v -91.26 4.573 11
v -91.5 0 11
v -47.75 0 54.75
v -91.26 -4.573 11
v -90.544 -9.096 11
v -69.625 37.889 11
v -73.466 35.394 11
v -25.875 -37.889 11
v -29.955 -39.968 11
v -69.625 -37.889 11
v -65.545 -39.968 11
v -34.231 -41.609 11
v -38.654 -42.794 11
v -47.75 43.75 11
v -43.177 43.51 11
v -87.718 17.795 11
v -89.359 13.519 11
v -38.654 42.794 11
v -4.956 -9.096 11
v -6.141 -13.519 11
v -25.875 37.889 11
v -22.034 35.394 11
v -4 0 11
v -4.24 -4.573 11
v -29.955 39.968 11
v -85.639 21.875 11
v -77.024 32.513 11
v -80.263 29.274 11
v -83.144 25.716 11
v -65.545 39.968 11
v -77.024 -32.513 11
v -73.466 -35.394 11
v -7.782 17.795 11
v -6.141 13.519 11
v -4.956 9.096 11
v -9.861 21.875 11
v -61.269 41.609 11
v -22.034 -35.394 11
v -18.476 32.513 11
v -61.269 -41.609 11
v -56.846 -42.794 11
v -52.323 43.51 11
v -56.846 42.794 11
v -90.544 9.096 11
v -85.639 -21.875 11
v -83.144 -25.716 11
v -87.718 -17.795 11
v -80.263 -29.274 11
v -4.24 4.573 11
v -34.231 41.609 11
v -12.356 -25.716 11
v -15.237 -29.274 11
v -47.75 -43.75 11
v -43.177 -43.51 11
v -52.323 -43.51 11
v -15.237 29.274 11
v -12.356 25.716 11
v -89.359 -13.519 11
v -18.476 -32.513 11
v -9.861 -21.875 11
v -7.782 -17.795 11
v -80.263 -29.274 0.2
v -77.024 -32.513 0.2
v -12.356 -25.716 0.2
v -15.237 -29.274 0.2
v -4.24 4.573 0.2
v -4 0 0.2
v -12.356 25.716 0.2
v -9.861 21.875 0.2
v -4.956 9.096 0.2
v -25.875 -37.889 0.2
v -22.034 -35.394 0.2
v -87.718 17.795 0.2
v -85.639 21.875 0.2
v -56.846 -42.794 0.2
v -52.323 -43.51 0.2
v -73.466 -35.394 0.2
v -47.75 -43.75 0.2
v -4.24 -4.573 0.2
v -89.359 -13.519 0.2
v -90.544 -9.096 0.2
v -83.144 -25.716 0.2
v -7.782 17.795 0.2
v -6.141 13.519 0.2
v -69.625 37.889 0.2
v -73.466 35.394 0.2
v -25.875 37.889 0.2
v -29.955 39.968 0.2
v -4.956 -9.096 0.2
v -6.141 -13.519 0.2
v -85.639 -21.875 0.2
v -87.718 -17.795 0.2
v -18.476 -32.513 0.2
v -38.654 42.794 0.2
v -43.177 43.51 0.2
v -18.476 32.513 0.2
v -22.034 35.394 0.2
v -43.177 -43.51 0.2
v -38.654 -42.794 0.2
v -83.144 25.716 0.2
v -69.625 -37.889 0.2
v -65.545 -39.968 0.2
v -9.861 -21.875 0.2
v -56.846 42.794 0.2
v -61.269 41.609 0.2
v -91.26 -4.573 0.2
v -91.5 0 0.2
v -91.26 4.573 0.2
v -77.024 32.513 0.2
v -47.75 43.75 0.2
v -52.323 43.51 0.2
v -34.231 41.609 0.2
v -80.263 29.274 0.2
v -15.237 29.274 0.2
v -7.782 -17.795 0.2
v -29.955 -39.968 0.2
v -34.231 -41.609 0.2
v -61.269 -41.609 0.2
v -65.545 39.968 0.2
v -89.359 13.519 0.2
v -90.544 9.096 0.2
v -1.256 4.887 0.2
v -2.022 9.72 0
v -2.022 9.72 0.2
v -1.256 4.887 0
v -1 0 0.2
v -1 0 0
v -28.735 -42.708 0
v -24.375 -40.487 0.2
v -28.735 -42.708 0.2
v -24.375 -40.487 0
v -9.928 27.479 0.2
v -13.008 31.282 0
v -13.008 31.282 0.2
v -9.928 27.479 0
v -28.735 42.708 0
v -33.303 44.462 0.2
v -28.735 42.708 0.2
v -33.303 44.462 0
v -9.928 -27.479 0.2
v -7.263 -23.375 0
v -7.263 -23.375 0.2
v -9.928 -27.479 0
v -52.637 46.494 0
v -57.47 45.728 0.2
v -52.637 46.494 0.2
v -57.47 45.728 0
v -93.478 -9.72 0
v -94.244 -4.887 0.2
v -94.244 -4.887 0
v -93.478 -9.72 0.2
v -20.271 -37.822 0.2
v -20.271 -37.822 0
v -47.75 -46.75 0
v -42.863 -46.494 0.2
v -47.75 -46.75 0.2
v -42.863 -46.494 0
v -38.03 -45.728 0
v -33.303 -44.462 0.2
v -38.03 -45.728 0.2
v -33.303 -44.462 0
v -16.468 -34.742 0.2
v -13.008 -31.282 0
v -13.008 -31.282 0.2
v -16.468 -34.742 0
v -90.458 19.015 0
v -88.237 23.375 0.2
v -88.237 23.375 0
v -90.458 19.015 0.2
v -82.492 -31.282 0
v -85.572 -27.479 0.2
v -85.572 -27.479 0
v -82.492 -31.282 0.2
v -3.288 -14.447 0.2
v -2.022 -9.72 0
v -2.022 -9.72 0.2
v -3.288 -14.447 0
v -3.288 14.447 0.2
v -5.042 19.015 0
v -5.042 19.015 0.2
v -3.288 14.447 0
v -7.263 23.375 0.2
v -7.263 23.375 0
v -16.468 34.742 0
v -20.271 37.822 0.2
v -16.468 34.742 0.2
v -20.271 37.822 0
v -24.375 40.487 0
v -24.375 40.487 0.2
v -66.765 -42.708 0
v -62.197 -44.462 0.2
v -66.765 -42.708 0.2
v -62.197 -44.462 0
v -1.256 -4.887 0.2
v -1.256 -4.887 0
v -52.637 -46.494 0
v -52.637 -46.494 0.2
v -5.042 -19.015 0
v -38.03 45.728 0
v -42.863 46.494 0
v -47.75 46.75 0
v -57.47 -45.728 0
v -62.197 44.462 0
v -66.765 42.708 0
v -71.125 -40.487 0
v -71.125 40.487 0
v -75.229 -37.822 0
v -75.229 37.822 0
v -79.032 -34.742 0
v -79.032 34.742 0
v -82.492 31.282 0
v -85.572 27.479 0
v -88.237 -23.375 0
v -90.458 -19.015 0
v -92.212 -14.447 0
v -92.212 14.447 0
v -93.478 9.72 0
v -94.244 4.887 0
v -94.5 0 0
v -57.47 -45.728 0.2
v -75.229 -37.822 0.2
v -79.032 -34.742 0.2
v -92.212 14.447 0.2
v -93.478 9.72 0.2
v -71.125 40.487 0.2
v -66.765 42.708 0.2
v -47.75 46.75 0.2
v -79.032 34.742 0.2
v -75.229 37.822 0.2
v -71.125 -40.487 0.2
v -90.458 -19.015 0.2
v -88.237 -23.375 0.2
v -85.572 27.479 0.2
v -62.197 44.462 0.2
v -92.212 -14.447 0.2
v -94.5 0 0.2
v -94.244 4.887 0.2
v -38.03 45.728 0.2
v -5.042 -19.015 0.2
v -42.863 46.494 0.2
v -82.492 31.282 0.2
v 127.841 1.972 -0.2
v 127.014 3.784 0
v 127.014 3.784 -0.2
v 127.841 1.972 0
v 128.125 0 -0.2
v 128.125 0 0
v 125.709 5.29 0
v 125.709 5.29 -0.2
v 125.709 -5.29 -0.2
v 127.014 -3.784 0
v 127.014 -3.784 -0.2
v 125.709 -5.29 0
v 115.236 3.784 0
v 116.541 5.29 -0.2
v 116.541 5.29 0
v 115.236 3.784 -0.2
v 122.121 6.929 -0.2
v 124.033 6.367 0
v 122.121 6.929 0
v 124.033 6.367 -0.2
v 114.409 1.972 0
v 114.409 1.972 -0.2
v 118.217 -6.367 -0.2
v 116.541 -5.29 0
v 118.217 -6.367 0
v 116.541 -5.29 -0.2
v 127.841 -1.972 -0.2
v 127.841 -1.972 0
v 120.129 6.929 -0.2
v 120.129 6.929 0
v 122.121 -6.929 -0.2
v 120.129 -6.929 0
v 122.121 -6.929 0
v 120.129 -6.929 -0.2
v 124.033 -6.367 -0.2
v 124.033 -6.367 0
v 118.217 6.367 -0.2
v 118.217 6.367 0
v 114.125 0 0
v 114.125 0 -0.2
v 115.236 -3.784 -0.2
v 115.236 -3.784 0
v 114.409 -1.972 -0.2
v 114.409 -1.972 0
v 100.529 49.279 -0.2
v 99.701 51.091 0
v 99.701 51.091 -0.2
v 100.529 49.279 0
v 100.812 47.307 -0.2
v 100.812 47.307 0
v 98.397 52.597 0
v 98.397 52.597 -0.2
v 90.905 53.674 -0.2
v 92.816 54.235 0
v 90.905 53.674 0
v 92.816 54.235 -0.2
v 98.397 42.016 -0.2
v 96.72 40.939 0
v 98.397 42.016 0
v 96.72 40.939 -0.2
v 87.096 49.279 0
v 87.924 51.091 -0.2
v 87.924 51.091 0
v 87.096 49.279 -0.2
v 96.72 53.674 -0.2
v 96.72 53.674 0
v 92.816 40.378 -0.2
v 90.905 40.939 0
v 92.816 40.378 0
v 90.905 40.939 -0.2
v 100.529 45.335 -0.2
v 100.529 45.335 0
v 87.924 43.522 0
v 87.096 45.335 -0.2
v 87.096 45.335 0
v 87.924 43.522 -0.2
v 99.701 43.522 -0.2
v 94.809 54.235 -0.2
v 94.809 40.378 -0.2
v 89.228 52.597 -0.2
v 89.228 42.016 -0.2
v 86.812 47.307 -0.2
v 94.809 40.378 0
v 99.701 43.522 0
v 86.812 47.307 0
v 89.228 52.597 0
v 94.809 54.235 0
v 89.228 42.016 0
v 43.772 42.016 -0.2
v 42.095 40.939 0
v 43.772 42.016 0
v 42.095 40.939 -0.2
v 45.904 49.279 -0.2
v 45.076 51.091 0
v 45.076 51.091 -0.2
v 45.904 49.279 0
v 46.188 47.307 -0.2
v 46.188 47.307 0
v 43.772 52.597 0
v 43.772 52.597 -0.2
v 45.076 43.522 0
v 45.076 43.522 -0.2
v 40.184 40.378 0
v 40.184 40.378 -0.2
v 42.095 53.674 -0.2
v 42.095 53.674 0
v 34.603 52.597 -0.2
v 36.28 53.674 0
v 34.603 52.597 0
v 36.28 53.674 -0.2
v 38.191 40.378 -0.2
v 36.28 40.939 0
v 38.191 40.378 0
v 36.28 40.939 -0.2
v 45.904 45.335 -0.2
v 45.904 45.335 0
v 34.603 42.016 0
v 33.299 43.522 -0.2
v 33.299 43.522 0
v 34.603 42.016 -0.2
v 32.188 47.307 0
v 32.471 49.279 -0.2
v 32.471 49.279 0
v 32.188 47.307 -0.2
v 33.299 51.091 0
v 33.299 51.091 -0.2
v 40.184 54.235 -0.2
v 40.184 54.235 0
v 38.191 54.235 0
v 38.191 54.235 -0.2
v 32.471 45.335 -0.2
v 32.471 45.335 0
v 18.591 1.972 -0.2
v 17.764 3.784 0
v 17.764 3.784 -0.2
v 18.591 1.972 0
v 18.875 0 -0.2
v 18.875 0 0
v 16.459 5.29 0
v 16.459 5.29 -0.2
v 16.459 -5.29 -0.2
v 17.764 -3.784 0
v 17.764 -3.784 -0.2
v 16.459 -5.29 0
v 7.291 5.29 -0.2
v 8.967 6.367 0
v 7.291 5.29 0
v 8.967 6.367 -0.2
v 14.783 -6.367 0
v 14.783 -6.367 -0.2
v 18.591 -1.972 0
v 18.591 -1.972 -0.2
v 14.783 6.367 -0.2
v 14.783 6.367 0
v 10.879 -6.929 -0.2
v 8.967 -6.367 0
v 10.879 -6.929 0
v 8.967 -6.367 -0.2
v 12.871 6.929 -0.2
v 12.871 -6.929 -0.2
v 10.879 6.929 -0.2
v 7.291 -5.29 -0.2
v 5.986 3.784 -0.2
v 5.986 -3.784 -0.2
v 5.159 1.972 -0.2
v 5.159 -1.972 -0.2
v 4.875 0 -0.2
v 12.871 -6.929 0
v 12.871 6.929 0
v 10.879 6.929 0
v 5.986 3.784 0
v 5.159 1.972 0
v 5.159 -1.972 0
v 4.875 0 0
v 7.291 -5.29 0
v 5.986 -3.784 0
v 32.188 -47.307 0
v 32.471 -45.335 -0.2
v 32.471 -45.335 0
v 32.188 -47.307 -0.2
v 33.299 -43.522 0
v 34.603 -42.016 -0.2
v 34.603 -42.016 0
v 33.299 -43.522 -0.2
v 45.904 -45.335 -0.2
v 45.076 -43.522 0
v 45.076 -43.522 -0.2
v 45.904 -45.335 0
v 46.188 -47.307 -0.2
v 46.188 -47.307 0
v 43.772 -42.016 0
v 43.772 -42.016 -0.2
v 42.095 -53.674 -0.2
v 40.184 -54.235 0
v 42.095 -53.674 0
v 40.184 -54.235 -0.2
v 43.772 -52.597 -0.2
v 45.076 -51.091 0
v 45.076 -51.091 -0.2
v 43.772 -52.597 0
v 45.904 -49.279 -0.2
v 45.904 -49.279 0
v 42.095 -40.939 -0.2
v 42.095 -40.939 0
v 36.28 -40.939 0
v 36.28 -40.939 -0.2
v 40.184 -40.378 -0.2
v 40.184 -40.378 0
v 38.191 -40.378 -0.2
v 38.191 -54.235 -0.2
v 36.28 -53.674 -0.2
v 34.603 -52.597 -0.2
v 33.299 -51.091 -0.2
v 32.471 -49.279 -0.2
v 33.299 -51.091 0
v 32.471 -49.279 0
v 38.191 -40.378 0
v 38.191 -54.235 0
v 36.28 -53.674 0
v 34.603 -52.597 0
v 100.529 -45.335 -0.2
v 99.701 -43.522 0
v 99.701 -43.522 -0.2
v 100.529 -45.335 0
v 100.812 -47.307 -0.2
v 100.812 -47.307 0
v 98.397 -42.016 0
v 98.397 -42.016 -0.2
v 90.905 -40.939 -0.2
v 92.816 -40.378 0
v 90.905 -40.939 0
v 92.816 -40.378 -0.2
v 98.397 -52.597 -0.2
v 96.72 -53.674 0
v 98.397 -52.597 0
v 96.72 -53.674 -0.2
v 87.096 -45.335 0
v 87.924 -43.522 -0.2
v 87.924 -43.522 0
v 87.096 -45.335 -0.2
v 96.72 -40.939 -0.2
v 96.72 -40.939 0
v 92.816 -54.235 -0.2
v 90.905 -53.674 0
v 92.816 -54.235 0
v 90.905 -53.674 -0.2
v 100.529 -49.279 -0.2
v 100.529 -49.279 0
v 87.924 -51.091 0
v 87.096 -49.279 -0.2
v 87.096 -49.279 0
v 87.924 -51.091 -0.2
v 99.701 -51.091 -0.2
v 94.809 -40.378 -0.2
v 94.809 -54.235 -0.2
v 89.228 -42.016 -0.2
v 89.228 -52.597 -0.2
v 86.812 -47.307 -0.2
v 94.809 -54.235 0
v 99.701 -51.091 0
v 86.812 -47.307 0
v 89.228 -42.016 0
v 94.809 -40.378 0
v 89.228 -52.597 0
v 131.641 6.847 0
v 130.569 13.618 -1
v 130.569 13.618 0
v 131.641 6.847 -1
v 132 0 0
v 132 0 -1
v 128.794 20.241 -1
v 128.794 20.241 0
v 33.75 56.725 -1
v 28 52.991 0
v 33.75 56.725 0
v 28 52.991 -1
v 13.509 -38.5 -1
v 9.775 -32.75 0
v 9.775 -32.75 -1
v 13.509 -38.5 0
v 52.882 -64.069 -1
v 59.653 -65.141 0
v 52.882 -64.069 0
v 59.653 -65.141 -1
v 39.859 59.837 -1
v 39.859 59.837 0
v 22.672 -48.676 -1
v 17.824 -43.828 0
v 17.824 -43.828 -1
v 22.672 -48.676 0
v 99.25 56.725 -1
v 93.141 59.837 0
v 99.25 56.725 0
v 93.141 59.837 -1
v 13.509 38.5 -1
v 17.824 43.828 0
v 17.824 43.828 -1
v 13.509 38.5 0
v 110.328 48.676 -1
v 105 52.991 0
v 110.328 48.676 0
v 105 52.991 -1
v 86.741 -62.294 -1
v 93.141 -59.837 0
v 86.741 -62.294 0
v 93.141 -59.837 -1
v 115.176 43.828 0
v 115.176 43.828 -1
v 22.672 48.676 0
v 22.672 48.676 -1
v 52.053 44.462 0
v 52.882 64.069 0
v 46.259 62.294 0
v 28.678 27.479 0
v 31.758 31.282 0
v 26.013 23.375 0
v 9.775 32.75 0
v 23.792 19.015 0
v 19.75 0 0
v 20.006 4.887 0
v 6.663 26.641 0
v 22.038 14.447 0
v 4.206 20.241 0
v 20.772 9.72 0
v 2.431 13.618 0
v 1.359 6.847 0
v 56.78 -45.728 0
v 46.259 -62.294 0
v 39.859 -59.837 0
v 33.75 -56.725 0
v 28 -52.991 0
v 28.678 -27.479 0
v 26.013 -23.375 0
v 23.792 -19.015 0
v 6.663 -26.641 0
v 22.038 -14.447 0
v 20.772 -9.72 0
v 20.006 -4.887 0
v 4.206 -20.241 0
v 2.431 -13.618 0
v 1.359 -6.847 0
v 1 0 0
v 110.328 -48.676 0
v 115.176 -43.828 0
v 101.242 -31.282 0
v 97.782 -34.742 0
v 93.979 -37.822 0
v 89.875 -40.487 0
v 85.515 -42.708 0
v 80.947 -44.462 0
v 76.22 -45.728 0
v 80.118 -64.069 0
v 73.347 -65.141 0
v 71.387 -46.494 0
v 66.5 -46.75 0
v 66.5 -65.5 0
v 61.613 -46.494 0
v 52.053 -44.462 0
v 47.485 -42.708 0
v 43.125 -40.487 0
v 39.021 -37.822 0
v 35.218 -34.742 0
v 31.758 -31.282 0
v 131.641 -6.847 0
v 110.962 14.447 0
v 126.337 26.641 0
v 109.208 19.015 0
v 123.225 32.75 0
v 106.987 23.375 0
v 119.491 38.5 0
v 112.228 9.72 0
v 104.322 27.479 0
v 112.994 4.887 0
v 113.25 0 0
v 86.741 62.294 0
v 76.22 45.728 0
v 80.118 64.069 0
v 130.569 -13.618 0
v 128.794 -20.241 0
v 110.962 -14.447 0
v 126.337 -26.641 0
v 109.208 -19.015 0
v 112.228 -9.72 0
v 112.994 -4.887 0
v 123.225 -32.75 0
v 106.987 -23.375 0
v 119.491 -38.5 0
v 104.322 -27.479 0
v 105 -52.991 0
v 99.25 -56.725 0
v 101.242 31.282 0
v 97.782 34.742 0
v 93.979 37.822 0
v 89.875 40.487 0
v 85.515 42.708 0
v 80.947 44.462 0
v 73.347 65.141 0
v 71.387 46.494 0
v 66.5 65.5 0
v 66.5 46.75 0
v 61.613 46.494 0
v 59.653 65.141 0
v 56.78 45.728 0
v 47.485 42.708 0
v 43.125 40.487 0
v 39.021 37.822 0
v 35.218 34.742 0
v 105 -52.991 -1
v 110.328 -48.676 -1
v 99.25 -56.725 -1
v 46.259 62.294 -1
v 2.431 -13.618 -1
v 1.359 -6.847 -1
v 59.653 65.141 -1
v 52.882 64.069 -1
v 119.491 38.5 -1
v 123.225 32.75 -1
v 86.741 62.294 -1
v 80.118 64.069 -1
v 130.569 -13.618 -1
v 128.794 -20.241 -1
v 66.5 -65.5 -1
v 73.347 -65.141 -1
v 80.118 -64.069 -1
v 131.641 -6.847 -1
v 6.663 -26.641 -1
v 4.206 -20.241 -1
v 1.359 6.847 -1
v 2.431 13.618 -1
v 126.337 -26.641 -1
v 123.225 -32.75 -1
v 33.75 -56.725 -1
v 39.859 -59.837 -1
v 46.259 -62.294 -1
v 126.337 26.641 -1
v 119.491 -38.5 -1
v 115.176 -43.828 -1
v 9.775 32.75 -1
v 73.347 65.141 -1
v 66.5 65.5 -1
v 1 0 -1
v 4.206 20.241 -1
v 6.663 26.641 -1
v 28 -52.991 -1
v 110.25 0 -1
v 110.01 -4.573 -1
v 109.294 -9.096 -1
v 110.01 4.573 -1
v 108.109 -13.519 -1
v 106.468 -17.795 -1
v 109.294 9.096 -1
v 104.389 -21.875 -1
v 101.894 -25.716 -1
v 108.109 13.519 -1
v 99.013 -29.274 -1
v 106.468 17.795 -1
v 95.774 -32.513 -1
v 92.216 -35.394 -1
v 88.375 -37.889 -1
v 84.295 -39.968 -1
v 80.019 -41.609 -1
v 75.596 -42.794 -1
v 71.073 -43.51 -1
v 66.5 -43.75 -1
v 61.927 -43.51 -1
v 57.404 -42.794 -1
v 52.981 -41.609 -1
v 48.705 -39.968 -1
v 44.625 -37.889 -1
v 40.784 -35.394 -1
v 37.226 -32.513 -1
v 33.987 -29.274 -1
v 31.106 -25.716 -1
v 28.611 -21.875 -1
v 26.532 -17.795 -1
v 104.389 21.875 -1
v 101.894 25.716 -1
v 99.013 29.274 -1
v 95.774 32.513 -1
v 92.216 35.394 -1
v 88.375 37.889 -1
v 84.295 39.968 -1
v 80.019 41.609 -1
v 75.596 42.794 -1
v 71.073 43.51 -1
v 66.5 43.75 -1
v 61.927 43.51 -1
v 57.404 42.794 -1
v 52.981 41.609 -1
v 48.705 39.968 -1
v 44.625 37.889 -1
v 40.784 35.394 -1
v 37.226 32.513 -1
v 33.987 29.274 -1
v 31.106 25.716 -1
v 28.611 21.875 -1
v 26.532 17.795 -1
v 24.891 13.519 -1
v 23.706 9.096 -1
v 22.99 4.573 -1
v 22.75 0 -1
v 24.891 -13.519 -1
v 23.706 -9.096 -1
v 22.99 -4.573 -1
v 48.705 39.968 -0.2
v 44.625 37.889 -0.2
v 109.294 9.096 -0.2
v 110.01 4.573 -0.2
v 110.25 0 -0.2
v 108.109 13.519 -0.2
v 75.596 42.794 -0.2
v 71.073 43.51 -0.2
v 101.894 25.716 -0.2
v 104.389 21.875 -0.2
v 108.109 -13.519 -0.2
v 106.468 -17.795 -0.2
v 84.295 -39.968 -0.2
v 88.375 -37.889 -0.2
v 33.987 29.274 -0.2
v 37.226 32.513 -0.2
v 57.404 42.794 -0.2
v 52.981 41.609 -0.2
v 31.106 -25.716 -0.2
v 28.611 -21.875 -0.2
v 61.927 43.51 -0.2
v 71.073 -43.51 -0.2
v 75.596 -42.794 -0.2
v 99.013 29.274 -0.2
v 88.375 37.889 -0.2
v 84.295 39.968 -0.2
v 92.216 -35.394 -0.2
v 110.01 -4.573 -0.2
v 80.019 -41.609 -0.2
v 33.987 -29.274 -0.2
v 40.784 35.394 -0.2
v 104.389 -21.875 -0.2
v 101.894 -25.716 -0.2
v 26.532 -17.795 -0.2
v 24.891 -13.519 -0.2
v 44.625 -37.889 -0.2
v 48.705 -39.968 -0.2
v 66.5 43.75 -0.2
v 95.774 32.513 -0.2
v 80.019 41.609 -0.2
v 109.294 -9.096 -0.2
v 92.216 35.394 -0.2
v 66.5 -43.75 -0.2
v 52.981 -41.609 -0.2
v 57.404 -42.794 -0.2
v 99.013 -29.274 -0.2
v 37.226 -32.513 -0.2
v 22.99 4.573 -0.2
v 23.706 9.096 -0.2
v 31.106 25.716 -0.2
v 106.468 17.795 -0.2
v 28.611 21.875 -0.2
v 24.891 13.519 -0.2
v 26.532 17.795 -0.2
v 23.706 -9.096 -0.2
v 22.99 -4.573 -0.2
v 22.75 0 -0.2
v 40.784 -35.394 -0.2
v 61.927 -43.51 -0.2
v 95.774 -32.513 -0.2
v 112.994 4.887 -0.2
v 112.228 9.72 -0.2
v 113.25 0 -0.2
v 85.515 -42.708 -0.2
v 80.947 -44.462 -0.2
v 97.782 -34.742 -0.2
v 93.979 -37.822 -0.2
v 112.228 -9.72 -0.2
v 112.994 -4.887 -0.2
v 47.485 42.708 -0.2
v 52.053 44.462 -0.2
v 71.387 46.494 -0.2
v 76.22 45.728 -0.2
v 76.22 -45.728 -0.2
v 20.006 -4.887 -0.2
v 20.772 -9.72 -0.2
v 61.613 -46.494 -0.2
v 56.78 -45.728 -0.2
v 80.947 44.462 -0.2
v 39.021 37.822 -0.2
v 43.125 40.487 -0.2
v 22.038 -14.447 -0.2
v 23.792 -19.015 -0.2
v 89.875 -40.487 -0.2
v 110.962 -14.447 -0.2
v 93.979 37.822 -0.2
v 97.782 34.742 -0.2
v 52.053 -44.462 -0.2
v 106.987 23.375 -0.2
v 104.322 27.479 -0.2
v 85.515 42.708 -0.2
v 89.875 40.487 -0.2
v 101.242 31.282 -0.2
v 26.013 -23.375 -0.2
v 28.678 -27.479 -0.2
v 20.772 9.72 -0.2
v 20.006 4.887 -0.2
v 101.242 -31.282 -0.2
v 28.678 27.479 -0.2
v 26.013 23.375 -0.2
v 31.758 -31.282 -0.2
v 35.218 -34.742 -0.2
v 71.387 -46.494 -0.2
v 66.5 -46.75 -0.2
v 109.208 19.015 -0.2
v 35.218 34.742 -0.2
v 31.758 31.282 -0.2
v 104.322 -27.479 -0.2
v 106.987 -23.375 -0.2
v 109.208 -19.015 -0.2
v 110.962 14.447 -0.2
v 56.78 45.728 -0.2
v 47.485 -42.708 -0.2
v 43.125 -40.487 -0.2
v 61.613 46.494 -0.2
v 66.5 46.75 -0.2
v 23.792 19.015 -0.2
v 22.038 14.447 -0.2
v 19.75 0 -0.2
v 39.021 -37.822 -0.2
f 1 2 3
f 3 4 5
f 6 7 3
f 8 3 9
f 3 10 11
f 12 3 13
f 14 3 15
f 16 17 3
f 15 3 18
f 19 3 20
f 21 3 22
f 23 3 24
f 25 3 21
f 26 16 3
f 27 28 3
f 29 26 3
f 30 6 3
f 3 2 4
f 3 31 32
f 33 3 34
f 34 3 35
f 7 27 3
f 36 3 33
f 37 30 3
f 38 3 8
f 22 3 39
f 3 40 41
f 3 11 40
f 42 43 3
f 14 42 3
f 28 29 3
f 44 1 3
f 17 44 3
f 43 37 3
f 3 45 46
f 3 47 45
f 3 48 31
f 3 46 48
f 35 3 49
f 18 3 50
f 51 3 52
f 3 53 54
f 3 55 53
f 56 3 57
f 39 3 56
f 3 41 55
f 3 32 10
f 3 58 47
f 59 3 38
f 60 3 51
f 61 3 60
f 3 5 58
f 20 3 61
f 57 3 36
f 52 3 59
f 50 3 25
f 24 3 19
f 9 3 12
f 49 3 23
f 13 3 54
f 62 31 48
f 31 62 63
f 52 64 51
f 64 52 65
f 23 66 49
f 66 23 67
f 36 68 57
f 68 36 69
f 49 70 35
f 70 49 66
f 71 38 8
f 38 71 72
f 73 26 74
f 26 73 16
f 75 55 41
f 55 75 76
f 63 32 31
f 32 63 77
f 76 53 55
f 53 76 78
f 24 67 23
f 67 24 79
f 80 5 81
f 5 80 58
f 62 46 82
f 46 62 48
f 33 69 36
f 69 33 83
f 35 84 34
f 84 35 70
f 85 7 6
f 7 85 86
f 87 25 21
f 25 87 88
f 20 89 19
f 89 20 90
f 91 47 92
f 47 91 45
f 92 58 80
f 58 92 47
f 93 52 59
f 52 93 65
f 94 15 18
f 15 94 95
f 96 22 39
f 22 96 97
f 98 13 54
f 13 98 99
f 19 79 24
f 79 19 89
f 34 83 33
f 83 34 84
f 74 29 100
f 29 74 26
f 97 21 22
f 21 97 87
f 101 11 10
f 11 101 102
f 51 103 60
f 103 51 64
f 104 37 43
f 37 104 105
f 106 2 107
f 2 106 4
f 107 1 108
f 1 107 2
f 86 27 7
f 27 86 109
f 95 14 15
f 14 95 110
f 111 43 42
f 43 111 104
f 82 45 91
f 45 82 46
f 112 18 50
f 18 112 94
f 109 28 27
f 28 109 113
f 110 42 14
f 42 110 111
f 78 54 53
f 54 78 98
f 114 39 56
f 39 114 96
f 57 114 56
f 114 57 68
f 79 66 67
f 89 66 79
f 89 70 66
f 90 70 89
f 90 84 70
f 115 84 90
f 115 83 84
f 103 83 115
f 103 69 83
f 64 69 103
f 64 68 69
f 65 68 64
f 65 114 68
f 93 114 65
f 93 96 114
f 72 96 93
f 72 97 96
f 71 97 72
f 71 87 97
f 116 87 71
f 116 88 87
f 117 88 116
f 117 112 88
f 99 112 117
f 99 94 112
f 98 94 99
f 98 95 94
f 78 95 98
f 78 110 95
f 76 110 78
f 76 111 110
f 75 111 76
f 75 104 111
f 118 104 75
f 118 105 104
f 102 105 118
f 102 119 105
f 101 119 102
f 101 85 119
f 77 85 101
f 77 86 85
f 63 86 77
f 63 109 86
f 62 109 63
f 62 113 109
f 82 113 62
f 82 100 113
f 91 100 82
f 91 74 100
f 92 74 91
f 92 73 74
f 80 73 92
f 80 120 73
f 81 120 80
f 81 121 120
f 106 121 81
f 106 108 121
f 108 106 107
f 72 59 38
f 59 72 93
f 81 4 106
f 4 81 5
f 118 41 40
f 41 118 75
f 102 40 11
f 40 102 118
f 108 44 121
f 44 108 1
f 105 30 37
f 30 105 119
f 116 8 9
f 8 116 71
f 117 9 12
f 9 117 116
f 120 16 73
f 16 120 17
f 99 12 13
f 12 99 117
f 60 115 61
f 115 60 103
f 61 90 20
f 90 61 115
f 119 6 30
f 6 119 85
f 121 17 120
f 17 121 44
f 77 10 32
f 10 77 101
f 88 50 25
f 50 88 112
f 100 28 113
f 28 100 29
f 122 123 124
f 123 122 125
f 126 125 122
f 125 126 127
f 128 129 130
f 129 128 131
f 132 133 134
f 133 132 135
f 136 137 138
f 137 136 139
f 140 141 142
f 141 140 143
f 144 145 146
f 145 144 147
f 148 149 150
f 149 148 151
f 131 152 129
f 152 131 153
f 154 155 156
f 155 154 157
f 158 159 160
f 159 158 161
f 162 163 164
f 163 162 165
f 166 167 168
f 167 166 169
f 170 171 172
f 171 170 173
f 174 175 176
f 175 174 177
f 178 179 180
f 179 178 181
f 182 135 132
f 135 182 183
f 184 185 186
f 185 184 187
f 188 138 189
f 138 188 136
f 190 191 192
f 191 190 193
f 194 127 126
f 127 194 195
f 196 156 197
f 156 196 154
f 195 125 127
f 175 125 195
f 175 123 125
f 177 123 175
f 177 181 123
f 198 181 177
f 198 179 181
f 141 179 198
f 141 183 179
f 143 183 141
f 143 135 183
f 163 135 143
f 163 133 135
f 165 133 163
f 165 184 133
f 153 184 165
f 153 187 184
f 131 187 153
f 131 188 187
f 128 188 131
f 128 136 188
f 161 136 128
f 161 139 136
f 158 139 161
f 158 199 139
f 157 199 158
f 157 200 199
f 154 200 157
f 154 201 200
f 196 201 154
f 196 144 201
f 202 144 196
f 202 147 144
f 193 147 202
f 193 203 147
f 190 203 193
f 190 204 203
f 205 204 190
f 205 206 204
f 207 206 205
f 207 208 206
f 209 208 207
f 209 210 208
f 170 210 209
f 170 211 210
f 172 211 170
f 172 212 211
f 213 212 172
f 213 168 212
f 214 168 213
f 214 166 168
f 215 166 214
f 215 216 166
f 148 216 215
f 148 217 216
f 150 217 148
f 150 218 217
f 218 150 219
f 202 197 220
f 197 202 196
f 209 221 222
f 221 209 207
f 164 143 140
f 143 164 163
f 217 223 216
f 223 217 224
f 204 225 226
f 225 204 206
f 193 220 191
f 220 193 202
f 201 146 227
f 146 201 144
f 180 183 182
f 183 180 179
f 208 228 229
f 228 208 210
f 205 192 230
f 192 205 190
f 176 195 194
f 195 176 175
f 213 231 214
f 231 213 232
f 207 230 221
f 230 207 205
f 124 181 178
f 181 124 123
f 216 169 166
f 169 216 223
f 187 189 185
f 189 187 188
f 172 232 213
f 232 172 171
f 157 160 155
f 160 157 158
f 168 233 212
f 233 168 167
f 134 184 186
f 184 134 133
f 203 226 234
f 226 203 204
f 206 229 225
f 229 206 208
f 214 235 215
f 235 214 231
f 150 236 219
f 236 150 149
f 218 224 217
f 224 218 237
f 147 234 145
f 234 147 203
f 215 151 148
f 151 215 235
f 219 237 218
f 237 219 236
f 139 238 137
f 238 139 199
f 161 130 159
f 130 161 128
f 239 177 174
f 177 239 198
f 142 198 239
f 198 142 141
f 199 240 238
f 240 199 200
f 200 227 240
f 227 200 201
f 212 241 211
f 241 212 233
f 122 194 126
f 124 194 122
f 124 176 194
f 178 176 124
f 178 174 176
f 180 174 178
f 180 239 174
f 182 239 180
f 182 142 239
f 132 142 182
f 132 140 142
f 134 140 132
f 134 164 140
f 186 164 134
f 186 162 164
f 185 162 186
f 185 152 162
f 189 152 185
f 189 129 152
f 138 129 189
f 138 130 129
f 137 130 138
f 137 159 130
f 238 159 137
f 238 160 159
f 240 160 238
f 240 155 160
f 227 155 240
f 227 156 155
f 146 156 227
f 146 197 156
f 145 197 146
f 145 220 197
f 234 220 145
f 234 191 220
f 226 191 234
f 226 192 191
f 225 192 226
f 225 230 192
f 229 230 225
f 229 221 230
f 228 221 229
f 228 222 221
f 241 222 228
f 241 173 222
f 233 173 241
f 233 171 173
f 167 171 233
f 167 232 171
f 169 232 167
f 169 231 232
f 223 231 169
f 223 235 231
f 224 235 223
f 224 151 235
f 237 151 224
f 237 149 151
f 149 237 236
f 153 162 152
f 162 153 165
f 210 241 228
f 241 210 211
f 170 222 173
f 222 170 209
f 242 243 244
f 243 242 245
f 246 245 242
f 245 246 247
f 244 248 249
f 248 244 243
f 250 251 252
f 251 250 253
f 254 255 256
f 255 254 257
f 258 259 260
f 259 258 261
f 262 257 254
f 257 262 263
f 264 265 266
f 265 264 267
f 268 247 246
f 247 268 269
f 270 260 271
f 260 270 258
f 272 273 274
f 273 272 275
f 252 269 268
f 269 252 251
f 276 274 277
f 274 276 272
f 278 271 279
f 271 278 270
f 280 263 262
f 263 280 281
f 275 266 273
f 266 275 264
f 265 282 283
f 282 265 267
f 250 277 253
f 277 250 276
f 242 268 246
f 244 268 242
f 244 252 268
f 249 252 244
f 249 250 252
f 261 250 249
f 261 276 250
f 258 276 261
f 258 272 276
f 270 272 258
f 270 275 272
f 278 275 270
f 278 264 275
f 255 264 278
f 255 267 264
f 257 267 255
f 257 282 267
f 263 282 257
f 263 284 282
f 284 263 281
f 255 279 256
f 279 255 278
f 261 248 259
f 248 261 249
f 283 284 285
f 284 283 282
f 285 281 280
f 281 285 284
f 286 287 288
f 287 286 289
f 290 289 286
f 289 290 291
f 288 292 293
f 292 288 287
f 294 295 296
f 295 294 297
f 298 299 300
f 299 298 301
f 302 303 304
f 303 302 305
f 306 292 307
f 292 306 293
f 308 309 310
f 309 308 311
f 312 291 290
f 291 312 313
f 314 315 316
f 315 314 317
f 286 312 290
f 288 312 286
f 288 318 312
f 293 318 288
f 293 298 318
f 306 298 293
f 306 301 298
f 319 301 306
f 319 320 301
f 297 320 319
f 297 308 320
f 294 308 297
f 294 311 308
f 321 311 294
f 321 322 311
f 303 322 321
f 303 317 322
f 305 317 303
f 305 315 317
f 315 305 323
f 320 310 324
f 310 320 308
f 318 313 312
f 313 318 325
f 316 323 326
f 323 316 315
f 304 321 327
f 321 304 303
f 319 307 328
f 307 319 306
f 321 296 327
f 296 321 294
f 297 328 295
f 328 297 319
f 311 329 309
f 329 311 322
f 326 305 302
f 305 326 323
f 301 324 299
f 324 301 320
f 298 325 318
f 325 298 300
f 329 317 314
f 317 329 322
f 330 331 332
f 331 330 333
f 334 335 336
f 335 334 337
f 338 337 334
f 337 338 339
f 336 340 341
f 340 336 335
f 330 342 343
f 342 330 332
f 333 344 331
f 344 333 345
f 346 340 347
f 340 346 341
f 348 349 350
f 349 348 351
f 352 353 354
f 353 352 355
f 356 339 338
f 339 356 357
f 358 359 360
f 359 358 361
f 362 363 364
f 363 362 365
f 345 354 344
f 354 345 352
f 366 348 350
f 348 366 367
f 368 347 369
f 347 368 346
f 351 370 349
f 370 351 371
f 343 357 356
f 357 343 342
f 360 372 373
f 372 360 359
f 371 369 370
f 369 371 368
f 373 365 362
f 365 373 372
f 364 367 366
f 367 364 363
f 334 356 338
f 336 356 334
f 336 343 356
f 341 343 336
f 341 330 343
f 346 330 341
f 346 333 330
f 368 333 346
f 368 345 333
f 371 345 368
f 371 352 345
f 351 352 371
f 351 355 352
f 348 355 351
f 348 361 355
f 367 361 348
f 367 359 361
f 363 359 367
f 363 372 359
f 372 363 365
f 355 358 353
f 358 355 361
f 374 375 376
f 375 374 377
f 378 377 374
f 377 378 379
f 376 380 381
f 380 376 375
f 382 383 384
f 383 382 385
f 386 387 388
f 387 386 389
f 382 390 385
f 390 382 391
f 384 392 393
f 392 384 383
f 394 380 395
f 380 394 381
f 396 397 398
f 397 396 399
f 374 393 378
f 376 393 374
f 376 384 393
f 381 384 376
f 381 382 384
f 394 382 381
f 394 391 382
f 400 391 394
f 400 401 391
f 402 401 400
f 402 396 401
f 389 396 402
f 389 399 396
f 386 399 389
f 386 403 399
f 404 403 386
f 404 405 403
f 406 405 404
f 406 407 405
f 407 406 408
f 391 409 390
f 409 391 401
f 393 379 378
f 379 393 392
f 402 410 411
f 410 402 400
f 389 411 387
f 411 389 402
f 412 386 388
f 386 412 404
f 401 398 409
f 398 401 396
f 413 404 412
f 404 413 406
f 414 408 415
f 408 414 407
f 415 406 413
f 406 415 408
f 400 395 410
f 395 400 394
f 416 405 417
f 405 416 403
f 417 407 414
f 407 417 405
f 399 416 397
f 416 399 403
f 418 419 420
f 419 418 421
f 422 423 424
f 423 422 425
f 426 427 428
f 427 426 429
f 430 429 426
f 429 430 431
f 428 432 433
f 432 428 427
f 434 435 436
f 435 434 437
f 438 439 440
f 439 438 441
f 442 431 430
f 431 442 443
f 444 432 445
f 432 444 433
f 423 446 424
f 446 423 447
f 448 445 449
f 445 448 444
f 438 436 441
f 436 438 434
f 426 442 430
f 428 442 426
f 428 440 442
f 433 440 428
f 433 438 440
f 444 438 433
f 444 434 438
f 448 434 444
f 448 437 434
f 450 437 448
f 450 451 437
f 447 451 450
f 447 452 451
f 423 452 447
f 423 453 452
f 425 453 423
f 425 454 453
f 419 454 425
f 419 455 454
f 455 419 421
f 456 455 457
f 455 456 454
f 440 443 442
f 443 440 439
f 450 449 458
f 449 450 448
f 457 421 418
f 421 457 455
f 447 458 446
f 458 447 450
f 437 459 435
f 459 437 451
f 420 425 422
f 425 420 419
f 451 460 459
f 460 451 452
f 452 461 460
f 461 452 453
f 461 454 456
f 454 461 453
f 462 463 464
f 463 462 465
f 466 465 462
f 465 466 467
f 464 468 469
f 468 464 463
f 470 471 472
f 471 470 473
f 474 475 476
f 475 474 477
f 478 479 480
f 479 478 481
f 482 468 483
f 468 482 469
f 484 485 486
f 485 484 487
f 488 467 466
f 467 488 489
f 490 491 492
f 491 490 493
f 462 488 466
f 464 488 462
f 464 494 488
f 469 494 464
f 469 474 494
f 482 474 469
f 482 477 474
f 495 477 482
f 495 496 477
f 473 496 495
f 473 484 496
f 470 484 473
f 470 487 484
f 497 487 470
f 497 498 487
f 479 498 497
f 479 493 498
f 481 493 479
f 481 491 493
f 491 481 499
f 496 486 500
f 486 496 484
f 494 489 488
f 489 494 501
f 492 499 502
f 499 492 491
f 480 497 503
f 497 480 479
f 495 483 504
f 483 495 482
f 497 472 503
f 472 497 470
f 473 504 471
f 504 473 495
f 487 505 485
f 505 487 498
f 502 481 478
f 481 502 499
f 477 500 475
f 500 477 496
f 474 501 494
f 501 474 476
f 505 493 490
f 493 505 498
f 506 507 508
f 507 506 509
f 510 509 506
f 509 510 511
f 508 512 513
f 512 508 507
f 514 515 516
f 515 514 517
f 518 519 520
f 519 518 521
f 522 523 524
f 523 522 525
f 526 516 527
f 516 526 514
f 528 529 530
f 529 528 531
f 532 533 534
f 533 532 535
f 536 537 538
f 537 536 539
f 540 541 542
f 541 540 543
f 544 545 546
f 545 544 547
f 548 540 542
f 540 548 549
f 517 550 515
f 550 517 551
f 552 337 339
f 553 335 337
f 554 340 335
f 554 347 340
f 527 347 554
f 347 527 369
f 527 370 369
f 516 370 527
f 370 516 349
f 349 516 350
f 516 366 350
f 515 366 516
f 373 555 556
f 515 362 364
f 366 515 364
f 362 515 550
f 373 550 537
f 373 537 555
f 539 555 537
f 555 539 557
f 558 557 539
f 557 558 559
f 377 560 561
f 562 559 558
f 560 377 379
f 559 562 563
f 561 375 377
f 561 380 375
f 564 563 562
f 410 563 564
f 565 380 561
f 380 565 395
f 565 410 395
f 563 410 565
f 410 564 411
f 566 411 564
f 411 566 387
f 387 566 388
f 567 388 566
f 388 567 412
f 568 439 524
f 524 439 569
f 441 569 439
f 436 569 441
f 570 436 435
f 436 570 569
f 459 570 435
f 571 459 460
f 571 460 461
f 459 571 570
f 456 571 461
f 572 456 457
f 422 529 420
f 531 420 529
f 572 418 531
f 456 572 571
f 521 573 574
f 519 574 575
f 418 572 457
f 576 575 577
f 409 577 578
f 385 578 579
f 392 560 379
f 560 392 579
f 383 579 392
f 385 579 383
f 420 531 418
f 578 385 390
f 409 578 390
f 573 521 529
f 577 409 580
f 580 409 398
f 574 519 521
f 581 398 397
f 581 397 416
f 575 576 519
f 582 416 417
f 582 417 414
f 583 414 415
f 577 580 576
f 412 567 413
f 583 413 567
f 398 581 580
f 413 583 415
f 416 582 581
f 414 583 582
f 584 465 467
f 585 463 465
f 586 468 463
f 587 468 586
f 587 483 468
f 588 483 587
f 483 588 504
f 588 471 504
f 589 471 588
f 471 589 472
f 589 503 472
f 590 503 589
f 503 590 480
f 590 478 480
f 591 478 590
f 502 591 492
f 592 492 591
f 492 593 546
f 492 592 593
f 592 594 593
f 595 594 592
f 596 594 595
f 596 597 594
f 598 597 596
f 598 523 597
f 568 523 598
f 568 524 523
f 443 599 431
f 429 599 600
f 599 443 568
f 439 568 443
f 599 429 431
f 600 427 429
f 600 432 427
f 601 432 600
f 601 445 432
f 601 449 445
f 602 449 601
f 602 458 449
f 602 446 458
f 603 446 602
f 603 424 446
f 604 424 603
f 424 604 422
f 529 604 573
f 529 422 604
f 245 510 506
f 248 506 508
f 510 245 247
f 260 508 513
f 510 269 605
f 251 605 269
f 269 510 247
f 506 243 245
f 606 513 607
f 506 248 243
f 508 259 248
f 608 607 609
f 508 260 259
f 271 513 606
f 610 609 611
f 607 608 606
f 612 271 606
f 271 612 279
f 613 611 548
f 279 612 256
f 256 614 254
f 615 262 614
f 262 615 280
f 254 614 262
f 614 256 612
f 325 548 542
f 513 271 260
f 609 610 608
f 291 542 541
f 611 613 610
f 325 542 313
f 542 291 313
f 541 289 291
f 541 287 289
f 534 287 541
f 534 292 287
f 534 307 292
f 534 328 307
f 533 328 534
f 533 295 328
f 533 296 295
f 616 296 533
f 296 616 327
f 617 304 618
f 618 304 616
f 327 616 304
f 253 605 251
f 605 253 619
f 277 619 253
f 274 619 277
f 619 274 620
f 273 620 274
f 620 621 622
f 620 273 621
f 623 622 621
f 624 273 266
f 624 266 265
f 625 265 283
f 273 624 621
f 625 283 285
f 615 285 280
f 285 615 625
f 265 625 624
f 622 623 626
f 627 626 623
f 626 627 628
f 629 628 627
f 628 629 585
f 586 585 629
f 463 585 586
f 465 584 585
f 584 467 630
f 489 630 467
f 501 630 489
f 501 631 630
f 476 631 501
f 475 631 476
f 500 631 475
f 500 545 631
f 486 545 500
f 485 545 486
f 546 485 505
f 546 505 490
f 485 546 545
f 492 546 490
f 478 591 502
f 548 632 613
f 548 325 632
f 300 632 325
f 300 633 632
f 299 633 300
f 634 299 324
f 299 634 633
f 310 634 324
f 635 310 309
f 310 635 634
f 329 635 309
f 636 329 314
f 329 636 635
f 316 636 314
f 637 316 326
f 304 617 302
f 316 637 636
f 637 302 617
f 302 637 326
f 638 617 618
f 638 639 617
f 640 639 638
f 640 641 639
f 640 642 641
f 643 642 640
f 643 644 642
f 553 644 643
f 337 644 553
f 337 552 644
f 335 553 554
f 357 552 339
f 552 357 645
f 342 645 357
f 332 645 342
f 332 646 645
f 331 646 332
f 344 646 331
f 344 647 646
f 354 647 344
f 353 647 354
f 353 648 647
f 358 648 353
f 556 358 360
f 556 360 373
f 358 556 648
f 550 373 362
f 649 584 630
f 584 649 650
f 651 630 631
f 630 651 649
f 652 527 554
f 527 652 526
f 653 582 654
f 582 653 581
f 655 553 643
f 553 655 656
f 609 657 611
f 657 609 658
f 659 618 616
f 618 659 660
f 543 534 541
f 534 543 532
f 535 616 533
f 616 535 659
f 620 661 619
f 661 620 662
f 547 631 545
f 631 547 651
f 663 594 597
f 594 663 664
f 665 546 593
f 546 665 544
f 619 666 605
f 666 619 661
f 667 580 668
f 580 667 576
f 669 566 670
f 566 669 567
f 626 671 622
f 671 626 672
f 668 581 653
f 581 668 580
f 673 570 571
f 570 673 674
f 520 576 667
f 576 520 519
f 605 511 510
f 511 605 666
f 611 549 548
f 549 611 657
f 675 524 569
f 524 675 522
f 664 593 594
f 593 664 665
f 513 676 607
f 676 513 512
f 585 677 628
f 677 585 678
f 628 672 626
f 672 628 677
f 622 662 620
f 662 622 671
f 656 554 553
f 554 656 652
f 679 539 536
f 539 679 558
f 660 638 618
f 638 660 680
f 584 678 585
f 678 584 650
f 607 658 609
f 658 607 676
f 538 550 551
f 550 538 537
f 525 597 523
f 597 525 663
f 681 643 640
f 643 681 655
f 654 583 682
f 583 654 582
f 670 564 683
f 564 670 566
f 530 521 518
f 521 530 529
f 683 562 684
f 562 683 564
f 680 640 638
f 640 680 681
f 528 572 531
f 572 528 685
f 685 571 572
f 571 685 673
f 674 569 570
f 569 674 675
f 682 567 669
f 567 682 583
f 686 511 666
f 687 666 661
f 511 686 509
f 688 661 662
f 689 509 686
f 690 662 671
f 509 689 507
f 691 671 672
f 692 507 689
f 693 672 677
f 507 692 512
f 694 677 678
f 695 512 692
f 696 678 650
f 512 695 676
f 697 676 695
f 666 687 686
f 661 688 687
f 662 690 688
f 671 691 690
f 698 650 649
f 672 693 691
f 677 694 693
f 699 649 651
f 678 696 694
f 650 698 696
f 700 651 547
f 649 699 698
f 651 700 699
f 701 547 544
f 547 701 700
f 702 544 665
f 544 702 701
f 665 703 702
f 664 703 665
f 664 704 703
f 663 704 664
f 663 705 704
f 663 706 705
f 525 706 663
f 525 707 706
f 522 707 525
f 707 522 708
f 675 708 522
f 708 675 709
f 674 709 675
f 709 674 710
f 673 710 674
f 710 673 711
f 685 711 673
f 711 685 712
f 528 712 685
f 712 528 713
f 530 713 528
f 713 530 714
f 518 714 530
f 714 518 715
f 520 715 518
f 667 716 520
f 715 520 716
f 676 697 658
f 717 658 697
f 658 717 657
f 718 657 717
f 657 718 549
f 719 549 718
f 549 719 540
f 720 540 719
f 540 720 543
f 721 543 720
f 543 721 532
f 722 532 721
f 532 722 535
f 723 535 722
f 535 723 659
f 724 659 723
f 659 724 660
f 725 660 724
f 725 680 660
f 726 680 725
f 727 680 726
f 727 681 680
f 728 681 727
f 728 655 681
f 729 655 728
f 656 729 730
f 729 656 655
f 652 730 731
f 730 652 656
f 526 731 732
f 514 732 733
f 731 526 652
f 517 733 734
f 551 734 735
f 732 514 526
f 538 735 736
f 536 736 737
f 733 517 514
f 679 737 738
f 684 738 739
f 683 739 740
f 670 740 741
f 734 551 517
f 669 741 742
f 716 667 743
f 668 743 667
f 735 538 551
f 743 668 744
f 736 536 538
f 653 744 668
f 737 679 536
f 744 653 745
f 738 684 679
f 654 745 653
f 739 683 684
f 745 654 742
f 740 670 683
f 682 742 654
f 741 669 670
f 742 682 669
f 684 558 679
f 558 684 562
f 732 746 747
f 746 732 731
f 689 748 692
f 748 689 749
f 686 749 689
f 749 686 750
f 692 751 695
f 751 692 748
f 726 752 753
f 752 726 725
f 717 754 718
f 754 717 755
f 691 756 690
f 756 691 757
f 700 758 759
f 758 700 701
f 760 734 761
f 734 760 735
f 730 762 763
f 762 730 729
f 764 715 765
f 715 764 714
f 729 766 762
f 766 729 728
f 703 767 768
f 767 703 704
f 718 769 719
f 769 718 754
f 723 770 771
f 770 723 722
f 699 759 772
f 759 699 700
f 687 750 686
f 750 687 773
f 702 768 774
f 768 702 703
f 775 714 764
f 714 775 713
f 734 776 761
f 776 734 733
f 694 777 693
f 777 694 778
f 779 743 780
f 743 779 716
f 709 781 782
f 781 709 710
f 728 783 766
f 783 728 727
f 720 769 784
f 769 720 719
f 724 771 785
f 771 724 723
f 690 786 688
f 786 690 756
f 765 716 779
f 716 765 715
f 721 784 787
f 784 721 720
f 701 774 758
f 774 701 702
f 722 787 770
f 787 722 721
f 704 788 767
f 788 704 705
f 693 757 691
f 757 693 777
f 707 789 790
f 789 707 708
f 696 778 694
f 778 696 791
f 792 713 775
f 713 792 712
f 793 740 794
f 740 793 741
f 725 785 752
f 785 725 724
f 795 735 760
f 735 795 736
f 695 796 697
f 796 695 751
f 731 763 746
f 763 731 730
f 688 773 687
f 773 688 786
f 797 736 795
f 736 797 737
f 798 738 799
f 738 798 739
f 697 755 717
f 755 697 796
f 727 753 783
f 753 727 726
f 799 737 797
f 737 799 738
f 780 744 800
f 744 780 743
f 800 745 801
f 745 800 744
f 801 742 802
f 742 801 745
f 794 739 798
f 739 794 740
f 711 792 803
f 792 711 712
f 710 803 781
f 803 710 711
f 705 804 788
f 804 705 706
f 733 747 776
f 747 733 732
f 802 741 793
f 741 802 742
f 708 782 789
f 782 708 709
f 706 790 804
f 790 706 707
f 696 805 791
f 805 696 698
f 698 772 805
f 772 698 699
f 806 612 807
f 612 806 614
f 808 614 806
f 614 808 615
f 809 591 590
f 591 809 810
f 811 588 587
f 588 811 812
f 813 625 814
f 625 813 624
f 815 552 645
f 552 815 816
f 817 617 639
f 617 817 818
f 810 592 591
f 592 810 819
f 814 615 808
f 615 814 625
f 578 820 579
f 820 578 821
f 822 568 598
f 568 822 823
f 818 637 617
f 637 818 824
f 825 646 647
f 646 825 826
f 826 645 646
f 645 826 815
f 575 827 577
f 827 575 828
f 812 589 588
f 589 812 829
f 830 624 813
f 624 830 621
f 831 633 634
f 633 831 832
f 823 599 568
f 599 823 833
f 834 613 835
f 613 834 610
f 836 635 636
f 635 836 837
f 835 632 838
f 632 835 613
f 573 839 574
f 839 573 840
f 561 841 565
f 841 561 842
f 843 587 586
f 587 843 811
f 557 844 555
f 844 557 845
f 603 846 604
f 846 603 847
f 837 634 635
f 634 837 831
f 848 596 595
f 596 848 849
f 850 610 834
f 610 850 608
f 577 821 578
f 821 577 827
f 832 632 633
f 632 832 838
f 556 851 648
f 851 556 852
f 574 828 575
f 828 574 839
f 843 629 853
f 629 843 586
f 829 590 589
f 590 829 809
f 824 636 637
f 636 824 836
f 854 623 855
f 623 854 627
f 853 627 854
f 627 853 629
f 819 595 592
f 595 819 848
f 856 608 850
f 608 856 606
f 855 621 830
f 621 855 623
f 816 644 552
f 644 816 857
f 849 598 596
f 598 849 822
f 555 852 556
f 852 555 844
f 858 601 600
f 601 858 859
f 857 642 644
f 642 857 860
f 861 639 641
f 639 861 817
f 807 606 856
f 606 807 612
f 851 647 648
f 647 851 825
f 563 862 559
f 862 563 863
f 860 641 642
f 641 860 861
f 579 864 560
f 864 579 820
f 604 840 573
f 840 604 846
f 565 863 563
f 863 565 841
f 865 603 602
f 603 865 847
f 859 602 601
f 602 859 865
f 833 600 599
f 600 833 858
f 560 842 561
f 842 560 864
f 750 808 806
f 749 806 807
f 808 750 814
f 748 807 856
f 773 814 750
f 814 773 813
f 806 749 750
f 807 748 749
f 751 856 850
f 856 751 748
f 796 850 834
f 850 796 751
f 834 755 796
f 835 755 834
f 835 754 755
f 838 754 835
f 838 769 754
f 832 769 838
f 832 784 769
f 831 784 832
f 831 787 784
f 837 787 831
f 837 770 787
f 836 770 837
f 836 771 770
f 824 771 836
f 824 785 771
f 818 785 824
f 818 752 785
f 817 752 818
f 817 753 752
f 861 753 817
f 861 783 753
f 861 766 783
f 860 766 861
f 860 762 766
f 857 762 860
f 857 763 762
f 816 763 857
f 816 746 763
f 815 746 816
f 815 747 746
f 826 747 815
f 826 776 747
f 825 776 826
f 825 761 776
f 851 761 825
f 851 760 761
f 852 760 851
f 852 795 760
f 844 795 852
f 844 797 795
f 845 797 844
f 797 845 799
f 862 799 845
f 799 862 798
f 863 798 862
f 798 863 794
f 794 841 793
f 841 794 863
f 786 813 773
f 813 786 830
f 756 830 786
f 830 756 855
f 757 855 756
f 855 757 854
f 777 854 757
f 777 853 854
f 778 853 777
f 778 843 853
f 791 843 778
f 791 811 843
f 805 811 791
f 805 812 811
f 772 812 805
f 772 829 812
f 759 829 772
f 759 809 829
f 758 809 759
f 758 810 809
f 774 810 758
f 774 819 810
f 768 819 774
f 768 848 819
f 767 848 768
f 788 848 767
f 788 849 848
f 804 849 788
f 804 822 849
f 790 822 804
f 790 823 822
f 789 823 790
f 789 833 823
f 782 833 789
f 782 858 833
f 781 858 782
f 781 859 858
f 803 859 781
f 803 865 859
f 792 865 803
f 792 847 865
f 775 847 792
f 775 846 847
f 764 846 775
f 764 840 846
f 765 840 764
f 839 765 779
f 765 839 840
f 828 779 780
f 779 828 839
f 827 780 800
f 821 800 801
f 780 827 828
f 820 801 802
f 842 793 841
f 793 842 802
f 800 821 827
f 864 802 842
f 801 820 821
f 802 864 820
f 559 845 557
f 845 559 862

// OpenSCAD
// Which of the two parts to generate
part = "both"; // [both, plug, rim]

// The inner diameter of the filter
inner_diameter = 87.5;

// The outer diameter of the filter
outer_diameter = 131;

// Height of the plug part
plug_height = 10;

// Height of the base rim
rim_height = 1;

// Width of the rim edge to join the parts neatly
rim_edge_width = 3;

// Diameter of a foot recess
foot_diameter = 14;

// Number of feet
number_of_feet = 6;

// Height of a single print layer
print_layer_height = 0.2;

module Cone(radius, height) {
    rotate_extrude()
    polygon([[0,0],[radius,0],[0,height]]);
};

$fa = 6;

module Plug() {
    ph = plug_height + (rim_height - print_layer_height);
    
    translate([0,0,print_layer_height]) {
        translate([0,0,ph])
        Cone(inner_diameter/2, inner_diameter/2);
    
        cylinder(h = ph, r = inner_diameter/2);
    }
    
    cylinder(h = print_layer_height, r = inner_diameter/2 + rim_edge_width);
}

module Rim() {
    mirror([0,0,1])
    difference() {
        cylinder(h = rim_height, r = outer_diameter/2);
        
        translate([0,0,-0.01])
        cylinder(h = rim_height + 0.02, r = inner_diameter/2);
        
        translate([0,0,-0.01])
        cylinder(h = print_layer_height + 0.01, r = inner_diameter/2 + rim_edge_width);

        for(i = [0:number_of_feet-1]) {
            a = 360 * i/number_of_feet;
            r = (outer_diameter + inner_diameter)/4;
            // The 0.01 here is just for better preview render
            translate([r * cos(a), r * sin(a),-0.01])
            cylinder(h = print_layer_height + 0.01, r = foot_diameter/2);
        }
    }
}

if(part == "plug") {
    Plug();   
} else if(part == "rim") {
    Rim();
} else {
    translate([-(inner_diameter/2 + rim_edge_width + 1), 0, 0])
    Plug();
    
    translate([outer_diameter/2 + 1, 0, 0])
    Rim();
}
